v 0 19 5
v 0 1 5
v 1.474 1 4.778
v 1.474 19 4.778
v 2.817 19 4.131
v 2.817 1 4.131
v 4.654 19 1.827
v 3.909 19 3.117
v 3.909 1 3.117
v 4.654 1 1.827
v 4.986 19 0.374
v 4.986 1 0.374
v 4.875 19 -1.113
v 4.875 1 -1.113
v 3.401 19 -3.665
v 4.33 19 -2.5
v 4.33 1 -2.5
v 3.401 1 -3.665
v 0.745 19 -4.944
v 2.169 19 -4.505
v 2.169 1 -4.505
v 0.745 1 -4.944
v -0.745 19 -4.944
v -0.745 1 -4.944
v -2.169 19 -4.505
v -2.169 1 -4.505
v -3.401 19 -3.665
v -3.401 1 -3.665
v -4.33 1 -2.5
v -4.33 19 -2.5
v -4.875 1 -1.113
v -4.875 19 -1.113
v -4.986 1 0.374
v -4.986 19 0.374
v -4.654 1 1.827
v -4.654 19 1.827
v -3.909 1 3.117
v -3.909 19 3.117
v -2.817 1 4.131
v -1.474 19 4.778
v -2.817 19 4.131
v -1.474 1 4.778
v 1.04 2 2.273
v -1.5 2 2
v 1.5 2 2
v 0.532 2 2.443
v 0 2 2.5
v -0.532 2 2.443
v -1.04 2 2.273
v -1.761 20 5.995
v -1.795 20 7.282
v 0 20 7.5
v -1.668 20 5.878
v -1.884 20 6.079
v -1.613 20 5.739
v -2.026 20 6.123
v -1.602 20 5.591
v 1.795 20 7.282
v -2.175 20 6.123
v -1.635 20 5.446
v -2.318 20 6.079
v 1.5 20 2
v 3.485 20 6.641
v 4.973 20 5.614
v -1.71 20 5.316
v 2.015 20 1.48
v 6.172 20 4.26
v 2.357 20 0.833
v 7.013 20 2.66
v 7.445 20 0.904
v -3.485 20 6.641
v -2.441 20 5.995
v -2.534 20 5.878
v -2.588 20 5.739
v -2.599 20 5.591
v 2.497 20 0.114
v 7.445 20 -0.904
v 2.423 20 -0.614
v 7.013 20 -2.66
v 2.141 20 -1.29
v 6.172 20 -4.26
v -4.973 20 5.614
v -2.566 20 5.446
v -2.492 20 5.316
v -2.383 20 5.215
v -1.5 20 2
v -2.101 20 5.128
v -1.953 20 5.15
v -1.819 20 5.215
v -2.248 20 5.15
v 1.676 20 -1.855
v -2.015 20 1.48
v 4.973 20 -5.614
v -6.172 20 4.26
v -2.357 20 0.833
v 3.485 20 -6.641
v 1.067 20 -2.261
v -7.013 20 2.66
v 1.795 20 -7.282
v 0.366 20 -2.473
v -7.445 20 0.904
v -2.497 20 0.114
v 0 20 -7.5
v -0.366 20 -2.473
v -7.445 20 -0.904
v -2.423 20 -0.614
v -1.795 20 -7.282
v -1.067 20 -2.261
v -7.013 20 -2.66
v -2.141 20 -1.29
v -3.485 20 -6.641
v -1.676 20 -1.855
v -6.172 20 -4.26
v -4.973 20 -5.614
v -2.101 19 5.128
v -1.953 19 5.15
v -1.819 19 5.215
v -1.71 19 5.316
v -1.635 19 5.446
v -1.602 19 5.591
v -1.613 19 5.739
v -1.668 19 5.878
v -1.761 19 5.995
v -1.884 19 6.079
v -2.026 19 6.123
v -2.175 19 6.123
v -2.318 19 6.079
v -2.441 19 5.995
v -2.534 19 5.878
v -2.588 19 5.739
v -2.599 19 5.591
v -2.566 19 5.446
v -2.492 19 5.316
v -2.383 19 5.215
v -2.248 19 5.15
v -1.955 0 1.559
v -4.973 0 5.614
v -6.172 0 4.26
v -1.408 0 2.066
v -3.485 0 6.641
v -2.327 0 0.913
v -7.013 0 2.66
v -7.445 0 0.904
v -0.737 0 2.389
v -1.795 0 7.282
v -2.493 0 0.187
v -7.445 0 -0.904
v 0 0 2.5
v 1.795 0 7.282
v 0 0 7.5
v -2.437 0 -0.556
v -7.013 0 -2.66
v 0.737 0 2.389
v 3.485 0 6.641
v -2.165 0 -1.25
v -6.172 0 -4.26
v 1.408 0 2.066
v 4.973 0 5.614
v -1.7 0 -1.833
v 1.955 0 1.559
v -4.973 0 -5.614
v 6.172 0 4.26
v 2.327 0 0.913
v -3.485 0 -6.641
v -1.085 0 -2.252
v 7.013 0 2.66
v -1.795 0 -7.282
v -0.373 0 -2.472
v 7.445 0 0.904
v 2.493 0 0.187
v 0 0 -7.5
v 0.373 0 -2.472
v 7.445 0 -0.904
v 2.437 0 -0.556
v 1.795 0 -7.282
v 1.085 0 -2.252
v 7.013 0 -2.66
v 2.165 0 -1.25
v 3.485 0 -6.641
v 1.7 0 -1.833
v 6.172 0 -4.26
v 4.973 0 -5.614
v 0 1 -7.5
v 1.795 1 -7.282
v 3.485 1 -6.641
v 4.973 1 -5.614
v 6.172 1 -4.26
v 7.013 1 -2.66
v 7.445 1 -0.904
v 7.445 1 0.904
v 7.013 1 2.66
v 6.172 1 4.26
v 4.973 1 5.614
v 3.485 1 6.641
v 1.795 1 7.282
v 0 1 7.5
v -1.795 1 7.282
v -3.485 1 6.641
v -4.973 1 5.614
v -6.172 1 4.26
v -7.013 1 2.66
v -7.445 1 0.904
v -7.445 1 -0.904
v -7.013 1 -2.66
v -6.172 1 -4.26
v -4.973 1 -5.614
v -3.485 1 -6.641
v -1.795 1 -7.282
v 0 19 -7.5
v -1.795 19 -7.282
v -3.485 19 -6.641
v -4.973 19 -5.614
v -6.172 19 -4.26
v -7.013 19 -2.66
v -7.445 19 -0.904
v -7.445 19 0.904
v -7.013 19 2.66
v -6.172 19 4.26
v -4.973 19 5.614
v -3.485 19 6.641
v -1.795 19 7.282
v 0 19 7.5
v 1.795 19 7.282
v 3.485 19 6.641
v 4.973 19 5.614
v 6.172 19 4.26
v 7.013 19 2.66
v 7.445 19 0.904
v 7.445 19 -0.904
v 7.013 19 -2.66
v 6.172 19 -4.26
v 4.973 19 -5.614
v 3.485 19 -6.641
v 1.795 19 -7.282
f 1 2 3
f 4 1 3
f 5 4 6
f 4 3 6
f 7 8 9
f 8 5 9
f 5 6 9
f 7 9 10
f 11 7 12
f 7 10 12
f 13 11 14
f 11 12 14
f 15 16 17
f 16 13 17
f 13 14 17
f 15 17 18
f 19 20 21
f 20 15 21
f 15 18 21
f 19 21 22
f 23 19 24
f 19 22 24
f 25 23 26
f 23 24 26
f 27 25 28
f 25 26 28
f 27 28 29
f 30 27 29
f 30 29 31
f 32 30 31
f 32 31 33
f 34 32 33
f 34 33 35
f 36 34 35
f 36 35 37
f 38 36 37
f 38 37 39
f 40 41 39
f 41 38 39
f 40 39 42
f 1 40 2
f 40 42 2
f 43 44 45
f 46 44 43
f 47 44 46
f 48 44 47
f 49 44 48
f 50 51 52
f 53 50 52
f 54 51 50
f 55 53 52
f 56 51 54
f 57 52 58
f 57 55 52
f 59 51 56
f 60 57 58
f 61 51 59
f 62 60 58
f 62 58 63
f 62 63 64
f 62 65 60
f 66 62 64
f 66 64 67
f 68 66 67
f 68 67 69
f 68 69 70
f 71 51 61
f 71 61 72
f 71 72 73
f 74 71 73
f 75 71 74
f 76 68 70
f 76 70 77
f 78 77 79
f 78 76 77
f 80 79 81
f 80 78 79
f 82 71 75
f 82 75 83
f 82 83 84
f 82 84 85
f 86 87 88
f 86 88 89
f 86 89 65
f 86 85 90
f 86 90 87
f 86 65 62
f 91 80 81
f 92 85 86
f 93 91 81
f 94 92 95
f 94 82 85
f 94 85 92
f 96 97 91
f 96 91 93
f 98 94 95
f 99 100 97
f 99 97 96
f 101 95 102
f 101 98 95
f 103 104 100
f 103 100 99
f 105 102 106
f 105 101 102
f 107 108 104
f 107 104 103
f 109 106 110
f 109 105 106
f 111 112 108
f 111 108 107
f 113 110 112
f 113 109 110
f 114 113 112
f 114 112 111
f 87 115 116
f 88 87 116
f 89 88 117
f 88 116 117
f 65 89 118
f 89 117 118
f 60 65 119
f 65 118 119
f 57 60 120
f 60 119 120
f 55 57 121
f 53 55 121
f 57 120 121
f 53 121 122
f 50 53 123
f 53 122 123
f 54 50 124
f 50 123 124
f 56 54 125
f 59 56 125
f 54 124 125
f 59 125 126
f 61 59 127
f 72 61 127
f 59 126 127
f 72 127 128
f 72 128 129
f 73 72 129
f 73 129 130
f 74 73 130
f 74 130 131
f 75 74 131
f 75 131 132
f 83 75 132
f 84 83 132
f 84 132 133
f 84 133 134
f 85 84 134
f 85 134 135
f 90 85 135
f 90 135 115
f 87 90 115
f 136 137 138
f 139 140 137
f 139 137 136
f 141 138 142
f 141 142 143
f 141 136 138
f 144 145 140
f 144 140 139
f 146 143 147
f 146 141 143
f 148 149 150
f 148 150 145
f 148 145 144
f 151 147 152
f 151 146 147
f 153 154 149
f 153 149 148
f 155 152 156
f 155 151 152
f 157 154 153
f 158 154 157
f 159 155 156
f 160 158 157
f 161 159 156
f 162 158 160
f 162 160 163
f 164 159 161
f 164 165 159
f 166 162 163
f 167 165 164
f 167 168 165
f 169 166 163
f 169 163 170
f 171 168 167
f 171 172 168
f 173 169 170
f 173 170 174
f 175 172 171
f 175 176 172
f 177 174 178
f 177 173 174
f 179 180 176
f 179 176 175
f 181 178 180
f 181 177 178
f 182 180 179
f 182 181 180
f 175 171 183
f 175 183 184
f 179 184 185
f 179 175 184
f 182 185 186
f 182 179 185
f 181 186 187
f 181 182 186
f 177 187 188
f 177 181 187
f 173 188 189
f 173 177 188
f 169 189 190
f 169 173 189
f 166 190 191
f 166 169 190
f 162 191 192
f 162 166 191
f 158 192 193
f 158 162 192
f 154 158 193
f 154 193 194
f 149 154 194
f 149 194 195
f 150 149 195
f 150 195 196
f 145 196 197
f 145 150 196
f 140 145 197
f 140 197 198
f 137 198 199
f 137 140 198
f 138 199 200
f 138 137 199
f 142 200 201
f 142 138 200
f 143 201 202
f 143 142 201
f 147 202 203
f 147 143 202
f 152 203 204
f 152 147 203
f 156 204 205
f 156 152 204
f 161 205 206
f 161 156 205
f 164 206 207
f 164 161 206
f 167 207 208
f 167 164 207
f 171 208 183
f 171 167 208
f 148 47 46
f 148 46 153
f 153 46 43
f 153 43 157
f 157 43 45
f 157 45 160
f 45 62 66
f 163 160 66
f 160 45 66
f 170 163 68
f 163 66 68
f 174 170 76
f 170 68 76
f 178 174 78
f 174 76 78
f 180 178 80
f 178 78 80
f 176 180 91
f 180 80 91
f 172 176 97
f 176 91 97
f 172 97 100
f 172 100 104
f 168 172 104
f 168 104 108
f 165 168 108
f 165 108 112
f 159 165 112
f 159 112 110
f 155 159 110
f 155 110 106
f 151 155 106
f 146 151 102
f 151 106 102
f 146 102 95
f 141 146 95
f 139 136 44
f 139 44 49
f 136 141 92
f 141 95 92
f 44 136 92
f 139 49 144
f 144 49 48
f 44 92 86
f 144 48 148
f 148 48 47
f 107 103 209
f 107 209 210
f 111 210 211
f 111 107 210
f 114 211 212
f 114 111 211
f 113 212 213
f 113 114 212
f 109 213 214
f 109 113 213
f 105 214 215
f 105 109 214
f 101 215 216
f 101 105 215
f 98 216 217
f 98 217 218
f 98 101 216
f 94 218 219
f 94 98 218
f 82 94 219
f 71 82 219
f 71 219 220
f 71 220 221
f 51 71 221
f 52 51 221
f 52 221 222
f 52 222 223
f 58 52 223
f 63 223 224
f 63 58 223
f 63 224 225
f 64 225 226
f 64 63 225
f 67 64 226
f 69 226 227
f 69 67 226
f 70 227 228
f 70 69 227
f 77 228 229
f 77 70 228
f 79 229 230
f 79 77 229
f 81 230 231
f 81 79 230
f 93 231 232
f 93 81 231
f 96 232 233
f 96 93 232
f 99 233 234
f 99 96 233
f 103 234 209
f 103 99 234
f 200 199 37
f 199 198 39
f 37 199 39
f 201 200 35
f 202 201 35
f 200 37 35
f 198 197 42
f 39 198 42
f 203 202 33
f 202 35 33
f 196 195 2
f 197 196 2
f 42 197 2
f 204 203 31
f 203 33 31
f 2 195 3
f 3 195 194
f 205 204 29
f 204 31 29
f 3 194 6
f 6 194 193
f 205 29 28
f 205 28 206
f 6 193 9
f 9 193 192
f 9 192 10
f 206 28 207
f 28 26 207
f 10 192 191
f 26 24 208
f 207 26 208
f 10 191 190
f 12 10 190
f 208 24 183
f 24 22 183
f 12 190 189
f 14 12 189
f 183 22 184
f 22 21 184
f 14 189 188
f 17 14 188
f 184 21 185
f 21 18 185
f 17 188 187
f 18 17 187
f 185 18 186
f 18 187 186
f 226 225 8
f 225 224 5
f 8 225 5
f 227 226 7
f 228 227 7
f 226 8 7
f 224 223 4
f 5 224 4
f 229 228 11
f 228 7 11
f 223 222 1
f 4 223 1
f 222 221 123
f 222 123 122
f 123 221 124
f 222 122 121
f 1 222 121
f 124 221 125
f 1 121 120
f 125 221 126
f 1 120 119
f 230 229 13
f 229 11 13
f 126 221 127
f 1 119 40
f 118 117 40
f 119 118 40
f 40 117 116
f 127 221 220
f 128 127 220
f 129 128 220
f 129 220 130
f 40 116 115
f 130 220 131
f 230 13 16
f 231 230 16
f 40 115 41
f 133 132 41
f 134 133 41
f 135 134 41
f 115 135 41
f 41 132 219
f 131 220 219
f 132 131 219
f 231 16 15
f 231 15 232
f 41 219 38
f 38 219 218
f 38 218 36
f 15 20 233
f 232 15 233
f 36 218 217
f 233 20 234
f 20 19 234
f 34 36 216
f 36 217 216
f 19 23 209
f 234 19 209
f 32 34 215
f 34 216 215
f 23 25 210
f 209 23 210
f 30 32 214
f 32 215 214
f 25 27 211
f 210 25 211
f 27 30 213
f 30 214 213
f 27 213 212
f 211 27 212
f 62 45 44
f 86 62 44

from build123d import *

# Parameters (mm, degrees)
SKETCH1_R           = 5
BOSS_EXTRUDE1_DEPTH = 20
SKETCH2_R           = 2.5
CUT_EXTRUDE1_DEPTH  = 21
BOSS_EXTRUDE2_DEPTH = 18
SKETCH5_R           = 7.5
SKETCH5_R_2         = 2.5
BOSS_EXTRUDE3_DEPTH = 1
SKETCH4_R           = 7.5
BOSS_EXTRUDE4_DEPTH = 1
SKETCH7_R           = 0.5
CUT_EXTRUDE2_DEPTH  = 2


with BuildPart() as part:
    # Sketch1 → Boss-Extrude1 (new body)
    with BuildSketch(Plane(origin=(0, 0, 0), x_dir=(1, 0, 0), z_dir=(0, 1, 0))):
        with Locations(Location((0, 0, 0), (0, 0, 270))):  # turned: the seam where the file's is
            Circle(SKETCH1_R)
    extrude(amount=BOSS_EXTRUDE1_DEPTH)

    # Sketch2 → Cut-Extrude1 (cut, through all)
    with BuildSketch(Plane(origin=(0, 20, 0), x_dir=(1, 0, 0), z_dir=(0, 1, 0))):
        with Locations(Location((0, 0, 0), (0, 0, 270))):  # turned: the seam where the file's is
            Circle(SKETCH2_R)
    extrude(amount=-CUT_EXTRUDE1_DEPTH, mode=Mode.SUBTRACT)

    # Sketch3 → Boss-Extrude2 (add)
    with BuildSketch(Plane(origin=(0, 20, 0), x_dir=(1, 0, 0), z_dir=(0, 1, 0))):
        with BuildLine():
            Line((1.5, -2), (-1.5, -2))
            ThreePointArc((-1.5, -2), (0, -2.5), (1.5, -2))
        make_face()
    extrude(amount=-BOSS_EXTRUDE2_DEPTH)

    # Sketch5 → Boss-Extrude3 (add)
    with BuildSketch(Plane.XZ):
        with Locations(Location((0, 0, 0), (0, 0, 270))):  # turned: the seam where the file's is
            Circle(SKETCH5_R)
        with Locations(Location((0, 0, 0), (0, 0, 90))):  # turned: the seam where the file's is
            Circle(SKETCH5_R_2, mode=Mode.SUBTRACT)
    extrude(amount=-BOSS_EXTRUDE3_DEPTH)

    # Sketch4 → Boss-Extrude4 (add)
    with BuildSketch(Plane(origin=(0, 20, 0), x_dir=(1, 0, 0), z_dir=(0, 1, 0))):
        with Locations(Location((0, 0, 0), (0, 0, 90))):  # turned: the seam where the file's is
            Circle(SKETCH4_R)
        with BuildLine():
            Line((1.5, -2), (-1.5, -2))
            ThreePointArc((-1.5, -2), (0, 2.5), (1.5, -2))
        make_face(mode=Mode.SUBTRACT)
    extrude(amount=-BOSS_EXTRUDE4_DEPTH)

    # Sketch7 → Cut-Extrude2 (cut, through all)
    with BuildSketch(Plane.XZ.offset(-19)):
        with Locations(Location((-2.100852557, 5.628196829, 0), (0, 0, 270))):  # turned: the seam where the file's is
            Circle(SKETCH7_R)
    extrude(amount=-CUT_EXTRUDE2_DEPTH, mode=Mode.SUBTRACT)


solid = part.part
